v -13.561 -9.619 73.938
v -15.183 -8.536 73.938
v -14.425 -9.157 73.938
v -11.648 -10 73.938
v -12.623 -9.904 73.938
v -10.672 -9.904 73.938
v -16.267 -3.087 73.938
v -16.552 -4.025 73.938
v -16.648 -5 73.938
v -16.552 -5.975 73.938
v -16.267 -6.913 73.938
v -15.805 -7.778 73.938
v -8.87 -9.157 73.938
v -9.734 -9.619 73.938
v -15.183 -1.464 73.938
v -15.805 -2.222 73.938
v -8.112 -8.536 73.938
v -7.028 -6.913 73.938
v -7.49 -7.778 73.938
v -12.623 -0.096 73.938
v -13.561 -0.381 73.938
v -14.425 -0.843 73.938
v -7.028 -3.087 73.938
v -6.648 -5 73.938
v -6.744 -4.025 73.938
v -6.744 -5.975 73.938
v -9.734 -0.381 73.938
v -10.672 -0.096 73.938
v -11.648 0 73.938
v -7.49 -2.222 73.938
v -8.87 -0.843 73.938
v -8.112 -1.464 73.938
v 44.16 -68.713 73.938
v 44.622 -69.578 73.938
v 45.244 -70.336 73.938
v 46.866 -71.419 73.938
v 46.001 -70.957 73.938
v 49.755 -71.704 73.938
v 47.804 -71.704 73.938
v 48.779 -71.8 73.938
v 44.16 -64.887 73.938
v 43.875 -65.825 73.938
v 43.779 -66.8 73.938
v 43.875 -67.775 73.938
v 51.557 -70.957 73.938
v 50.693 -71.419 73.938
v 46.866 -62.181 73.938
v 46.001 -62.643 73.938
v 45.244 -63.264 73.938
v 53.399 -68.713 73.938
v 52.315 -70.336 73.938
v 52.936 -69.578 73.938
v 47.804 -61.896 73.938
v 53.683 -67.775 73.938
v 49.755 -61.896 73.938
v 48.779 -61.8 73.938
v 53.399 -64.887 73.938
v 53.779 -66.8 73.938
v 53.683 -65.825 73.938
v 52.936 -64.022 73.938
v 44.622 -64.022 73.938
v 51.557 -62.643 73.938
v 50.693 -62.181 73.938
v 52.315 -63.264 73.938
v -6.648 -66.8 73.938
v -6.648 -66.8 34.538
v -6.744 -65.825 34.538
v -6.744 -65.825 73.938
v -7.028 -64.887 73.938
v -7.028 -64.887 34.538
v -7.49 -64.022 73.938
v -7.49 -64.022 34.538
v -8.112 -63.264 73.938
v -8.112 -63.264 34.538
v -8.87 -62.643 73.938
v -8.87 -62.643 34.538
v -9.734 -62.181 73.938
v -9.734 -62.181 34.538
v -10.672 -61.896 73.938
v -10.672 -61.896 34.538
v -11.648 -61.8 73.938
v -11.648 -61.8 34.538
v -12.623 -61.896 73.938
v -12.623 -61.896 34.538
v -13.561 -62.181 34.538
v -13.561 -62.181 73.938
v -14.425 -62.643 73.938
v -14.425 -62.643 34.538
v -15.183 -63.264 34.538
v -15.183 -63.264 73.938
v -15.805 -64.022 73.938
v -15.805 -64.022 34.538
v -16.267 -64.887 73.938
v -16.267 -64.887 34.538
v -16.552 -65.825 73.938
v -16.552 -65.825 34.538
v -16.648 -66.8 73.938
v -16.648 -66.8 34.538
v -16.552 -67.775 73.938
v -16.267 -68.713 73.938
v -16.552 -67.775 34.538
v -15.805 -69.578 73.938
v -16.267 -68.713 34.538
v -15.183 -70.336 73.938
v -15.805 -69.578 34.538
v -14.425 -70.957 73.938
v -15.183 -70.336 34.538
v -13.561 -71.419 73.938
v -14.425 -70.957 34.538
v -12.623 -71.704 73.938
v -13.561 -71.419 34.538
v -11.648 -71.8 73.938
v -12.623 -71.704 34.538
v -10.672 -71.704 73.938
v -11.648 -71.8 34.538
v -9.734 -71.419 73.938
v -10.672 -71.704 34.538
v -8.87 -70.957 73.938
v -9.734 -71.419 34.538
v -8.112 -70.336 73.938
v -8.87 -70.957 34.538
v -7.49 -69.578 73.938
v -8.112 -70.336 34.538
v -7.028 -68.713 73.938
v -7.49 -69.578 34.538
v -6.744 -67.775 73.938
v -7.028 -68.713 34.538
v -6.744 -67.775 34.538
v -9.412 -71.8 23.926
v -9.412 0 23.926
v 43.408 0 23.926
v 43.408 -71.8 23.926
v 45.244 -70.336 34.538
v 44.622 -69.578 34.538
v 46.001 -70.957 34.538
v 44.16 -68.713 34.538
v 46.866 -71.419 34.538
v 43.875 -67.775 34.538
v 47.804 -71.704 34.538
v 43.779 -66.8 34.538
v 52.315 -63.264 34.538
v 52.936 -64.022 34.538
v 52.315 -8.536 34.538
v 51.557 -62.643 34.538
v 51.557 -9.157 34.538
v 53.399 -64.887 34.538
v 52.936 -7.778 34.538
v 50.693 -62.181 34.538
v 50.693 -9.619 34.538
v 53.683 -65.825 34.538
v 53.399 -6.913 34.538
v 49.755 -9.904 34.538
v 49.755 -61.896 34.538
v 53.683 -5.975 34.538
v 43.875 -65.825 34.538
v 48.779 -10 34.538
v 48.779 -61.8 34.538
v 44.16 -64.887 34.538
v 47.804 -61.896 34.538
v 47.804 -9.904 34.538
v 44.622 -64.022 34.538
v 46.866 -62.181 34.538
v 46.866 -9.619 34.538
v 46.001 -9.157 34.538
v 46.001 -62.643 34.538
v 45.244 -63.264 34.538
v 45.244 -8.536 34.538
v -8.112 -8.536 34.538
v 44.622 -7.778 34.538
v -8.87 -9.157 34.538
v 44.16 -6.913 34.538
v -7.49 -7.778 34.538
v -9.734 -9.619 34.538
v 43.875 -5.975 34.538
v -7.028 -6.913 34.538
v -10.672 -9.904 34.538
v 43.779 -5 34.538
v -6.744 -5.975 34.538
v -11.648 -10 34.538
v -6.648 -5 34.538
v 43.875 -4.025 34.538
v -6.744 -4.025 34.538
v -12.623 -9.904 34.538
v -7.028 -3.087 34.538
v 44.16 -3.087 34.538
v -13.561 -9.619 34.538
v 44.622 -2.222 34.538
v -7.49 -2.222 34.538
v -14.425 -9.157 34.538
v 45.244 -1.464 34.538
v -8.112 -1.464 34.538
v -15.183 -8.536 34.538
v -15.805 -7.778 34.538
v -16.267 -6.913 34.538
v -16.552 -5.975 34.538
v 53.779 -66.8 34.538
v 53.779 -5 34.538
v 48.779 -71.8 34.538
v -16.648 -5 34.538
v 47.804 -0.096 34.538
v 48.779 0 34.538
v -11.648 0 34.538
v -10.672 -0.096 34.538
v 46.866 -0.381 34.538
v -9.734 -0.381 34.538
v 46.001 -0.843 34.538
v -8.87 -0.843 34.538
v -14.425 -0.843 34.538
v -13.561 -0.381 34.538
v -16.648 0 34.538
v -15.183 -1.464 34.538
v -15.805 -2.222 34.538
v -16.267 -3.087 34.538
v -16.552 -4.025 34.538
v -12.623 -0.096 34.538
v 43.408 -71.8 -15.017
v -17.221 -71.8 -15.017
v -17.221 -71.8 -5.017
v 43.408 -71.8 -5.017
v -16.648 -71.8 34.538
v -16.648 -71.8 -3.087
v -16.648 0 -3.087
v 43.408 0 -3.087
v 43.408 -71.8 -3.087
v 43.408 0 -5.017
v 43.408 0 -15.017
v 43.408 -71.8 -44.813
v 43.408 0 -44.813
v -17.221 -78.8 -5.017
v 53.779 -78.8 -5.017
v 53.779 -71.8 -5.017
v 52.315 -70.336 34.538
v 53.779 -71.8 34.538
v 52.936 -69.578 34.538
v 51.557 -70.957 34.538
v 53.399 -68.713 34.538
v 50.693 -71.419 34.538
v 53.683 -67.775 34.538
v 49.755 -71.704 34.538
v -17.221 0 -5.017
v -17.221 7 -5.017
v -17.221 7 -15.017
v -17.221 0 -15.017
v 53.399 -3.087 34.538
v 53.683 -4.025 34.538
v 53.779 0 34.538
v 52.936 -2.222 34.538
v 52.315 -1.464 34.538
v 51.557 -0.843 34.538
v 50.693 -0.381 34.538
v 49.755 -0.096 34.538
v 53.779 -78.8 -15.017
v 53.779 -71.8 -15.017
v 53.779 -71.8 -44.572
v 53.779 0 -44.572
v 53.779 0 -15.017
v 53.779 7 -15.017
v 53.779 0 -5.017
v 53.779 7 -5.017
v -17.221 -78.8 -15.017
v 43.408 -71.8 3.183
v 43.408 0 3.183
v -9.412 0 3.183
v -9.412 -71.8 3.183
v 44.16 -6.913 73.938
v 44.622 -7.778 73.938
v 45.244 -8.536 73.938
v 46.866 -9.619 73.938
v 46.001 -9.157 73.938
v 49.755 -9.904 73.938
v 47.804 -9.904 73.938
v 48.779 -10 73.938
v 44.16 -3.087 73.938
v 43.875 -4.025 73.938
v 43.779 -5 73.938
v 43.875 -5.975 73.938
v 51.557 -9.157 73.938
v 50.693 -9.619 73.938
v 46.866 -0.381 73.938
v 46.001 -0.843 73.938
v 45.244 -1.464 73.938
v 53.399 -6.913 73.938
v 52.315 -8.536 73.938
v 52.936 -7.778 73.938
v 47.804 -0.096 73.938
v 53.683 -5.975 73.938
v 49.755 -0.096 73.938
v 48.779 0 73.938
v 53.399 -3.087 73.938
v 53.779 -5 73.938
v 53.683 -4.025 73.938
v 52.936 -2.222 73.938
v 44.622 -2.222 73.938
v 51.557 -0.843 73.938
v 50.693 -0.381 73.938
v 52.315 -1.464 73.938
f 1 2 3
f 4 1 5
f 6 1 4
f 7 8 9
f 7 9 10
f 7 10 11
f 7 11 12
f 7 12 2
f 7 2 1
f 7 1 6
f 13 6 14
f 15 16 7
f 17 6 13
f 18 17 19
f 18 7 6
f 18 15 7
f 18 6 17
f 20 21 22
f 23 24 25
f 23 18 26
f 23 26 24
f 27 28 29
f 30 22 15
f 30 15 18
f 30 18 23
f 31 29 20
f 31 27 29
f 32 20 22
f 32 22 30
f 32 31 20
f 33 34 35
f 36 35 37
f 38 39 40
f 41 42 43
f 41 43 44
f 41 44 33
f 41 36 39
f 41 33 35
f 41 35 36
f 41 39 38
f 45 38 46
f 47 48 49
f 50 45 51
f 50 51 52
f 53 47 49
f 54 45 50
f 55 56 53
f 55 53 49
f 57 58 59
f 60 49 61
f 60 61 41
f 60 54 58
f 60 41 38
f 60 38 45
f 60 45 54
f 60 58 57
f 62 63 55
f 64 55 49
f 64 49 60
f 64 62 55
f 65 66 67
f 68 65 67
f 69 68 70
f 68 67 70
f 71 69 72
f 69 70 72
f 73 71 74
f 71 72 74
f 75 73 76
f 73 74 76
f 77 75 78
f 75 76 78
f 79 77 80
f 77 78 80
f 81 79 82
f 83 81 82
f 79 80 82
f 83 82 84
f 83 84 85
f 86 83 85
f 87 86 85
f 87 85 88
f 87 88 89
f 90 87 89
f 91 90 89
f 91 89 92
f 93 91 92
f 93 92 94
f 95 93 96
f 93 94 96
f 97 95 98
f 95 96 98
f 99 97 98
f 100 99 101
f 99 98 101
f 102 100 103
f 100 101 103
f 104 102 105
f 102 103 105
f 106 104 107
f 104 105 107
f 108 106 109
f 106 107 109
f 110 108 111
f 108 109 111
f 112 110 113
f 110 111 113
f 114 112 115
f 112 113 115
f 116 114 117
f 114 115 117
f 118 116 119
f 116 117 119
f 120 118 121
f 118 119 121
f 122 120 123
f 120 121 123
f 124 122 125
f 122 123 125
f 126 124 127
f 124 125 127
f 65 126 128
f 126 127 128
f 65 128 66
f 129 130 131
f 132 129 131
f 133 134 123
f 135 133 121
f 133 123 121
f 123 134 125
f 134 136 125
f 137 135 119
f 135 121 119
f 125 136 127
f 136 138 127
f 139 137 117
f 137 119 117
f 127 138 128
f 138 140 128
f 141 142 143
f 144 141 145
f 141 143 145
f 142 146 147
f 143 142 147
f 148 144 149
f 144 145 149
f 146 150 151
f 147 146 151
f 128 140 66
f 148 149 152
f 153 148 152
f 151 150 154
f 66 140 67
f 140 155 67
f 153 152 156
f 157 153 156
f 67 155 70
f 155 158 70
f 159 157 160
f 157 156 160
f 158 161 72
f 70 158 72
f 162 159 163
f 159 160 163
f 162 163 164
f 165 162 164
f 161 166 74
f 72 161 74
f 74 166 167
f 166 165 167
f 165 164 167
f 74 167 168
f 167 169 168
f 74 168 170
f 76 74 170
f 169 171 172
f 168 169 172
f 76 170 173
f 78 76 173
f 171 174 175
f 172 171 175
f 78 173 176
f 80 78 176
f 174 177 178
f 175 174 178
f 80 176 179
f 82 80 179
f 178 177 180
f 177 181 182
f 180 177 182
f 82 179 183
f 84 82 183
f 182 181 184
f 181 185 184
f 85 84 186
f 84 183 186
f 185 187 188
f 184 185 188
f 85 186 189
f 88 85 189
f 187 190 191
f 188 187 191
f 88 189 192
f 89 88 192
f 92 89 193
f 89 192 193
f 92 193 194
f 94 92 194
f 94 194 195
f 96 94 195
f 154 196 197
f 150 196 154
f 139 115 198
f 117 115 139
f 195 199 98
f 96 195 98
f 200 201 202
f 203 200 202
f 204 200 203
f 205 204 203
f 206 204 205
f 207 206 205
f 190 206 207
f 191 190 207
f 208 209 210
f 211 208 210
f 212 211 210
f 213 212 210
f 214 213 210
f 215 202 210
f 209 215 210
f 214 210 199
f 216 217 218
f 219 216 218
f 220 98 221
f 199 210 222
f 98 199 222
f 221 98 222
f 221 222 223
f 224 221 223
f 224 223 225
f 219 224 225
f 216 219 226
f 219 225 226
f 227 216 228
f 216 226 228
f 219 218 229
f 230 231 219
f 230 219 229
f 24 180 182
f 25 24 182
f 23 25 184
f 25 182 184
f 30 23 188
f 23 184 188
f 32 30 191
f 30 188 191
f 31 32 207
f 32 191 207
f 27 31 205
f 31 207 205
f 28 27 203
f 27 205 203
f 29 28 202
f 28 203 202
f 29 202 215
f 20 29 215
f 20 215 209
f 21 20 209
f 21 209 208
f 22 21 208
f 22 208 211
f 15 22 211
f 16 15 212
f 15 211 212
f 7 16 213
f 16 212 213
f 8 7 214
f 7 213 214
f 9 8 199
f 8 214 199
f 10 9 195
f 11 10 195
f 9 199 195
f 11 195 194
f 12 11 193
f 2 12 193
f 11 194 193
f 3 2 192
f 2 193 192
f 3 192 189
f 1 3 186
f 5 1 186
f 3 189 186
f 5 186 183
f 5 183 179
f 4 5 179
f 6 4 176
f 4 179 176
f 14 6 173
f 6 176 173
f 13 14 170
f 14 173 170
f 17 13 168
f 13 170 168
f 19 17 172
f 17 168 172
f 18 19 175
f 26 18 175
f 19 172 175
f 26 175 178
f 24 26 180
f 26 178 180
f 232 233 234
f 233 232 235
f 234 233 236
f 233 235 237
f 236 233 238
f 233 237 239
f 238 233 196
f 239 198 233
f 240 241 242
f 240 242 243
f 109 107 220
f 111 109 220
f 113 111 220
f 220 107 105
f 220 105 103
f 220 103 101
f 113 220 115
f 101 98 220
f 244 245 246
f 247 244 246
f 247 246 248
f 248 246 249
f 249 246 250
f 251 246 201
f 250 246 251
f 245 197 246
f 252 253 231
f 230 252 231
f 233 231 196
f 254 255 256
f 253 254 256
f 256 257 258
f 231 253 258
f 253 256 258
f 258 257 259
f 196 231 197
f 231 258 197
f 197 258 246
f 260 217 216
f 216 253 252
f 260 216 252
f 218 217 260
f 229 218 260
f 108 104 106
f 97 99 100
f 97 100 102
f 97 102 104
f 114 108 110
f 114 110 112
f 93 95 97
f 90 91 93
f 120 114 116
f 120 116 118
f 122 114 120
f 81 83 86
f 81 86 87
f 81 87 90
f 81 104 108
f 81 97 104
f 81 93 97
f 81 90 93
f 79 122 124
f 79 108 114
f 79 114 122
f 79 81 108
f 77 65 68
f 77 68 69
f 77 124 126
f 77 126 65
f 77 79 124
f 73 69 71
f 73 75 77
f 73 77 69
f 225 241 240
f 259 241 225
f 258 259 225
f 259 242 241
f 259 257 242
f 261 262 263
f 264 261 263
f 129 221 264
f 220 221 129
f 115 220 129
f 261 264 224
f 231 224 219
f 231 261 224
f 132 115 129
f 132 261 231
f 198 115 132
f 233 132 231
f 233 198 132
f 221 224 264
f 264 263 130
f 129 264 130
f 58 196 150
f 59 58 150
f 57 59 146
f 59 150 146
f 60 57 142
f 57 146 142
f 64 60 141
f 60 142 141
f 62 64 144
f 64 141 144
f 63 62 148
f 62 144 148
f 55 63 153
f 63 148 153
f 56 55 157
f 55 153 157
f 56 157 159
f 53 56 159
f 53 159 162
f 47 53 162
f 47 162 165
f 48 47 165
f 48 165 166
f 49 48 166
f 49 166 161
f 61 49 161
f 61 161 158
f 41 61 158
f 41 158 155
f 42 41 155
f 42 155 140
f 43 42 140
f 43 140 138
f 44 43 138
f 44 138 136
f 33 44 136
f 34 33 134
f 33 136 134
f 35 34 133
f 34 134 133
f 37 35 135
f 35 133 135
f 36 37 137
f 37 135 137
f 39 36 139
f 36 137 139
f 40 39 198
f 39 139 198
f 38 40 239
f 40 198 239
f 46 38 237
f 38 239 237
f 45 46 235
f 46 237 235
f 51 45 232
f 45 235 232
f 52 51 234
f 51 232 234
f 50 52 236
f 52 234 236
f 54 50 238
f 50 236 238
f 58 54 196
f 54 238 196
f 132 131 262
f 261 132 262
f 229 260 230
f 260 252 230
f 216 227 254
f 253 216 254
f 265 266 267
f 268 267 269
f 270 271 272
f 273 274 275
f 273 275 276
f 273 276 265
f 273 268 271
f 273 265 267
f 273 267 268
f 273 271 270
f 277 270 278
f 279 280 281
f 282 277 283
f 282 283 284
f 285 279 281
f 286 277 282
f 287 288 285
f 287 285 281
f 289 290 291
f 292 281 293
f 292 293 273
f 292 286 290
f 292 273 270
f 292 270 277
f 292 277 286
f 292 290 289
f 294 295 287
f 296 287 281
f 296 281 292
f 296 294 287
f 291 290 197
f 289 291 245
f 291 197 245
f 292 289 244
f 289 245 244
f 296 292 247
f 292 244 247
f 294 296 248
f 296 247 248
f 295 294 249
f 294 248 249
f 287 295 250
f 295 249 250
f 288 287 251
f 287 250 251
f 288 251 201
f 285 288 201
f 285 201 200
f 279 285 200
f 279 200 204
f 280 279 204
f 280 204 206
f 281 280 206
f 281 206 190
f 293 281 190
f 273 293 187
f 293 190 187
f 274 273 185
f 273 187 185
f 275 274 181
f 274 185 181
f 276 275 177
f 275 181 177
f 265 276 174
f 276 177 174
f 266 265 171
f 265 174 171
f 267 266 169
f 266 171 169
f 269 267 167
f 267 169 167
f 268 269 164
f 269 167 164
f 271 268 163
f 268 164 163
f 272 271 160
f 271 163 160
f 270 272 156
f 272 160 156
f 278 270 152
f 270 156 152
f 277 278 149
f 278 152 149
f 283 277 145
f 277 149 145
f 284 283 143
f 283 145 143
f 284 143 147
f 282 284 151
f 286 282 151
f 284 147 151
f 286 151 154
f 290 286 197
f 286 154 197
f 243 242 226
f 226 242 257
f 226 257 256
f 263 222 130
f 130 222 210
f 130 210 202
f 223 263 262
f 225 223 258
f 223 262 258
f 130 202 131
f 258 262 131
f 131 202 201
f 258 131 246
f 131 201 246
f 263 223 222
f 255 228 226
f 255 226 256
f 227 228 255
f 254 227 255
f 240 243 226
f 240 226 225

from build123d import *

# Parameters (mm, degrees)
F1_DEPTH  = 71.8
F2_R      = 5
F3_DEPTH  = 39.4
F4_W      = 9
F4_H      = 10
F5_DEPTH  = 7
F6_W      = 9
F6_H      = 10
F7_DEPTH  = 7
F5_FACE_W = 7
F5_FACE_H = 10
F8_DEPTH  = 62
F7_FACE_W = 7
F7_FACE_H = 10
F9_DEPTH  = 62


with BuildPart() as f1:
    # F0 (on Front) → F1 (new body)
    with BuildSketch(Plane.XZ):
        Polygon((43.408085, -3.087412), (43.408085, -44.812847), (53.779151, -44.57166), (53.779151, 34.537837), (-16.647598, 34.537837), (-16.647598, 23.925588), (-9.411974, 23.925588), (43.408085, 23.925588), (43.408085, 3.183464), align=None)
        Polygon((-16.647598, -3.087412), (43.408085, -3.087412), (43.408085, 3.183464), (-9.411974, 3.183464), (-9.411974, 23.925588), (-16.647598, 23.925588), align=None)
    extrude(amount=F1_DEPTH)

    # F2 (on face) → F3 (join)
    with BuildSketch(Plane.XY.offset(34.537837)):
        with BuildLine():
            ThreePointArc((-16.647598, -66.8), (-11.647598, -71.8), (-6.647598, -66.8))
            ThreePointArc((-6.647598, -66.8), (-11.647598, -61.8), (-16.647598, -66.8))
        make_face()
        with Locations((48.779151, -66.8)):
            Circle(F2_R)
        with Locations((48.779151, -5)):
            Circle(F2_R)
        with BuildLine():
            ThreePointArc((-16.647598, -5), (-11.647598, -10), (-6.647598, -5))
            ThreePointArc((-6.647598, -5), (-11.647598, 0), (-16.647598, -5))
        make_face()
    extrude(amount=F3_DEPTH)

    # F4 (on face) → F5 (join)
    with BuildSketch(Plane.XZ.offset(71.8)):
        with Locations((49.279151, -10.016912)):
            Rectangle(F4_W, F4_H)
    extrude(amount=F5_DEPTH)

    # F6 (on face) → F7 (join)
    with BuildSketch(Plane(origin=(0, 0, 0), x_dir=(-1, 0, 0), z_dir=(0, 1, 0))):
        with Locations((-49.279151, -10.016912)):
            Rectangle(F6_W, F6_H)
    extrude(amount=F7_DEPTH)

    # F5_face (on face) → F8 (join)
    with BuildSketch(Plane(origin=(44.779151, -75.3, -10.016912), x_dir=(0, -1, 0), z_dir=(-1, 0, 0))):
        Rectangle(F5_FACE_W, F5_FACE_H)
    extrude(amount=F8_DEPTH)

    # F7_face (on face) → F9 (join)
    with BuildSketch(Plane(origin=(44.779151, 3.5, -10.016912), x_dir=(0, -1, 0), z_dir=(-1, 0, 0))):
        Rectangle(F7_FACE_W, F7_FACE_H)
    extrude(amount=F9_DEPTH)


solid = f1.part
